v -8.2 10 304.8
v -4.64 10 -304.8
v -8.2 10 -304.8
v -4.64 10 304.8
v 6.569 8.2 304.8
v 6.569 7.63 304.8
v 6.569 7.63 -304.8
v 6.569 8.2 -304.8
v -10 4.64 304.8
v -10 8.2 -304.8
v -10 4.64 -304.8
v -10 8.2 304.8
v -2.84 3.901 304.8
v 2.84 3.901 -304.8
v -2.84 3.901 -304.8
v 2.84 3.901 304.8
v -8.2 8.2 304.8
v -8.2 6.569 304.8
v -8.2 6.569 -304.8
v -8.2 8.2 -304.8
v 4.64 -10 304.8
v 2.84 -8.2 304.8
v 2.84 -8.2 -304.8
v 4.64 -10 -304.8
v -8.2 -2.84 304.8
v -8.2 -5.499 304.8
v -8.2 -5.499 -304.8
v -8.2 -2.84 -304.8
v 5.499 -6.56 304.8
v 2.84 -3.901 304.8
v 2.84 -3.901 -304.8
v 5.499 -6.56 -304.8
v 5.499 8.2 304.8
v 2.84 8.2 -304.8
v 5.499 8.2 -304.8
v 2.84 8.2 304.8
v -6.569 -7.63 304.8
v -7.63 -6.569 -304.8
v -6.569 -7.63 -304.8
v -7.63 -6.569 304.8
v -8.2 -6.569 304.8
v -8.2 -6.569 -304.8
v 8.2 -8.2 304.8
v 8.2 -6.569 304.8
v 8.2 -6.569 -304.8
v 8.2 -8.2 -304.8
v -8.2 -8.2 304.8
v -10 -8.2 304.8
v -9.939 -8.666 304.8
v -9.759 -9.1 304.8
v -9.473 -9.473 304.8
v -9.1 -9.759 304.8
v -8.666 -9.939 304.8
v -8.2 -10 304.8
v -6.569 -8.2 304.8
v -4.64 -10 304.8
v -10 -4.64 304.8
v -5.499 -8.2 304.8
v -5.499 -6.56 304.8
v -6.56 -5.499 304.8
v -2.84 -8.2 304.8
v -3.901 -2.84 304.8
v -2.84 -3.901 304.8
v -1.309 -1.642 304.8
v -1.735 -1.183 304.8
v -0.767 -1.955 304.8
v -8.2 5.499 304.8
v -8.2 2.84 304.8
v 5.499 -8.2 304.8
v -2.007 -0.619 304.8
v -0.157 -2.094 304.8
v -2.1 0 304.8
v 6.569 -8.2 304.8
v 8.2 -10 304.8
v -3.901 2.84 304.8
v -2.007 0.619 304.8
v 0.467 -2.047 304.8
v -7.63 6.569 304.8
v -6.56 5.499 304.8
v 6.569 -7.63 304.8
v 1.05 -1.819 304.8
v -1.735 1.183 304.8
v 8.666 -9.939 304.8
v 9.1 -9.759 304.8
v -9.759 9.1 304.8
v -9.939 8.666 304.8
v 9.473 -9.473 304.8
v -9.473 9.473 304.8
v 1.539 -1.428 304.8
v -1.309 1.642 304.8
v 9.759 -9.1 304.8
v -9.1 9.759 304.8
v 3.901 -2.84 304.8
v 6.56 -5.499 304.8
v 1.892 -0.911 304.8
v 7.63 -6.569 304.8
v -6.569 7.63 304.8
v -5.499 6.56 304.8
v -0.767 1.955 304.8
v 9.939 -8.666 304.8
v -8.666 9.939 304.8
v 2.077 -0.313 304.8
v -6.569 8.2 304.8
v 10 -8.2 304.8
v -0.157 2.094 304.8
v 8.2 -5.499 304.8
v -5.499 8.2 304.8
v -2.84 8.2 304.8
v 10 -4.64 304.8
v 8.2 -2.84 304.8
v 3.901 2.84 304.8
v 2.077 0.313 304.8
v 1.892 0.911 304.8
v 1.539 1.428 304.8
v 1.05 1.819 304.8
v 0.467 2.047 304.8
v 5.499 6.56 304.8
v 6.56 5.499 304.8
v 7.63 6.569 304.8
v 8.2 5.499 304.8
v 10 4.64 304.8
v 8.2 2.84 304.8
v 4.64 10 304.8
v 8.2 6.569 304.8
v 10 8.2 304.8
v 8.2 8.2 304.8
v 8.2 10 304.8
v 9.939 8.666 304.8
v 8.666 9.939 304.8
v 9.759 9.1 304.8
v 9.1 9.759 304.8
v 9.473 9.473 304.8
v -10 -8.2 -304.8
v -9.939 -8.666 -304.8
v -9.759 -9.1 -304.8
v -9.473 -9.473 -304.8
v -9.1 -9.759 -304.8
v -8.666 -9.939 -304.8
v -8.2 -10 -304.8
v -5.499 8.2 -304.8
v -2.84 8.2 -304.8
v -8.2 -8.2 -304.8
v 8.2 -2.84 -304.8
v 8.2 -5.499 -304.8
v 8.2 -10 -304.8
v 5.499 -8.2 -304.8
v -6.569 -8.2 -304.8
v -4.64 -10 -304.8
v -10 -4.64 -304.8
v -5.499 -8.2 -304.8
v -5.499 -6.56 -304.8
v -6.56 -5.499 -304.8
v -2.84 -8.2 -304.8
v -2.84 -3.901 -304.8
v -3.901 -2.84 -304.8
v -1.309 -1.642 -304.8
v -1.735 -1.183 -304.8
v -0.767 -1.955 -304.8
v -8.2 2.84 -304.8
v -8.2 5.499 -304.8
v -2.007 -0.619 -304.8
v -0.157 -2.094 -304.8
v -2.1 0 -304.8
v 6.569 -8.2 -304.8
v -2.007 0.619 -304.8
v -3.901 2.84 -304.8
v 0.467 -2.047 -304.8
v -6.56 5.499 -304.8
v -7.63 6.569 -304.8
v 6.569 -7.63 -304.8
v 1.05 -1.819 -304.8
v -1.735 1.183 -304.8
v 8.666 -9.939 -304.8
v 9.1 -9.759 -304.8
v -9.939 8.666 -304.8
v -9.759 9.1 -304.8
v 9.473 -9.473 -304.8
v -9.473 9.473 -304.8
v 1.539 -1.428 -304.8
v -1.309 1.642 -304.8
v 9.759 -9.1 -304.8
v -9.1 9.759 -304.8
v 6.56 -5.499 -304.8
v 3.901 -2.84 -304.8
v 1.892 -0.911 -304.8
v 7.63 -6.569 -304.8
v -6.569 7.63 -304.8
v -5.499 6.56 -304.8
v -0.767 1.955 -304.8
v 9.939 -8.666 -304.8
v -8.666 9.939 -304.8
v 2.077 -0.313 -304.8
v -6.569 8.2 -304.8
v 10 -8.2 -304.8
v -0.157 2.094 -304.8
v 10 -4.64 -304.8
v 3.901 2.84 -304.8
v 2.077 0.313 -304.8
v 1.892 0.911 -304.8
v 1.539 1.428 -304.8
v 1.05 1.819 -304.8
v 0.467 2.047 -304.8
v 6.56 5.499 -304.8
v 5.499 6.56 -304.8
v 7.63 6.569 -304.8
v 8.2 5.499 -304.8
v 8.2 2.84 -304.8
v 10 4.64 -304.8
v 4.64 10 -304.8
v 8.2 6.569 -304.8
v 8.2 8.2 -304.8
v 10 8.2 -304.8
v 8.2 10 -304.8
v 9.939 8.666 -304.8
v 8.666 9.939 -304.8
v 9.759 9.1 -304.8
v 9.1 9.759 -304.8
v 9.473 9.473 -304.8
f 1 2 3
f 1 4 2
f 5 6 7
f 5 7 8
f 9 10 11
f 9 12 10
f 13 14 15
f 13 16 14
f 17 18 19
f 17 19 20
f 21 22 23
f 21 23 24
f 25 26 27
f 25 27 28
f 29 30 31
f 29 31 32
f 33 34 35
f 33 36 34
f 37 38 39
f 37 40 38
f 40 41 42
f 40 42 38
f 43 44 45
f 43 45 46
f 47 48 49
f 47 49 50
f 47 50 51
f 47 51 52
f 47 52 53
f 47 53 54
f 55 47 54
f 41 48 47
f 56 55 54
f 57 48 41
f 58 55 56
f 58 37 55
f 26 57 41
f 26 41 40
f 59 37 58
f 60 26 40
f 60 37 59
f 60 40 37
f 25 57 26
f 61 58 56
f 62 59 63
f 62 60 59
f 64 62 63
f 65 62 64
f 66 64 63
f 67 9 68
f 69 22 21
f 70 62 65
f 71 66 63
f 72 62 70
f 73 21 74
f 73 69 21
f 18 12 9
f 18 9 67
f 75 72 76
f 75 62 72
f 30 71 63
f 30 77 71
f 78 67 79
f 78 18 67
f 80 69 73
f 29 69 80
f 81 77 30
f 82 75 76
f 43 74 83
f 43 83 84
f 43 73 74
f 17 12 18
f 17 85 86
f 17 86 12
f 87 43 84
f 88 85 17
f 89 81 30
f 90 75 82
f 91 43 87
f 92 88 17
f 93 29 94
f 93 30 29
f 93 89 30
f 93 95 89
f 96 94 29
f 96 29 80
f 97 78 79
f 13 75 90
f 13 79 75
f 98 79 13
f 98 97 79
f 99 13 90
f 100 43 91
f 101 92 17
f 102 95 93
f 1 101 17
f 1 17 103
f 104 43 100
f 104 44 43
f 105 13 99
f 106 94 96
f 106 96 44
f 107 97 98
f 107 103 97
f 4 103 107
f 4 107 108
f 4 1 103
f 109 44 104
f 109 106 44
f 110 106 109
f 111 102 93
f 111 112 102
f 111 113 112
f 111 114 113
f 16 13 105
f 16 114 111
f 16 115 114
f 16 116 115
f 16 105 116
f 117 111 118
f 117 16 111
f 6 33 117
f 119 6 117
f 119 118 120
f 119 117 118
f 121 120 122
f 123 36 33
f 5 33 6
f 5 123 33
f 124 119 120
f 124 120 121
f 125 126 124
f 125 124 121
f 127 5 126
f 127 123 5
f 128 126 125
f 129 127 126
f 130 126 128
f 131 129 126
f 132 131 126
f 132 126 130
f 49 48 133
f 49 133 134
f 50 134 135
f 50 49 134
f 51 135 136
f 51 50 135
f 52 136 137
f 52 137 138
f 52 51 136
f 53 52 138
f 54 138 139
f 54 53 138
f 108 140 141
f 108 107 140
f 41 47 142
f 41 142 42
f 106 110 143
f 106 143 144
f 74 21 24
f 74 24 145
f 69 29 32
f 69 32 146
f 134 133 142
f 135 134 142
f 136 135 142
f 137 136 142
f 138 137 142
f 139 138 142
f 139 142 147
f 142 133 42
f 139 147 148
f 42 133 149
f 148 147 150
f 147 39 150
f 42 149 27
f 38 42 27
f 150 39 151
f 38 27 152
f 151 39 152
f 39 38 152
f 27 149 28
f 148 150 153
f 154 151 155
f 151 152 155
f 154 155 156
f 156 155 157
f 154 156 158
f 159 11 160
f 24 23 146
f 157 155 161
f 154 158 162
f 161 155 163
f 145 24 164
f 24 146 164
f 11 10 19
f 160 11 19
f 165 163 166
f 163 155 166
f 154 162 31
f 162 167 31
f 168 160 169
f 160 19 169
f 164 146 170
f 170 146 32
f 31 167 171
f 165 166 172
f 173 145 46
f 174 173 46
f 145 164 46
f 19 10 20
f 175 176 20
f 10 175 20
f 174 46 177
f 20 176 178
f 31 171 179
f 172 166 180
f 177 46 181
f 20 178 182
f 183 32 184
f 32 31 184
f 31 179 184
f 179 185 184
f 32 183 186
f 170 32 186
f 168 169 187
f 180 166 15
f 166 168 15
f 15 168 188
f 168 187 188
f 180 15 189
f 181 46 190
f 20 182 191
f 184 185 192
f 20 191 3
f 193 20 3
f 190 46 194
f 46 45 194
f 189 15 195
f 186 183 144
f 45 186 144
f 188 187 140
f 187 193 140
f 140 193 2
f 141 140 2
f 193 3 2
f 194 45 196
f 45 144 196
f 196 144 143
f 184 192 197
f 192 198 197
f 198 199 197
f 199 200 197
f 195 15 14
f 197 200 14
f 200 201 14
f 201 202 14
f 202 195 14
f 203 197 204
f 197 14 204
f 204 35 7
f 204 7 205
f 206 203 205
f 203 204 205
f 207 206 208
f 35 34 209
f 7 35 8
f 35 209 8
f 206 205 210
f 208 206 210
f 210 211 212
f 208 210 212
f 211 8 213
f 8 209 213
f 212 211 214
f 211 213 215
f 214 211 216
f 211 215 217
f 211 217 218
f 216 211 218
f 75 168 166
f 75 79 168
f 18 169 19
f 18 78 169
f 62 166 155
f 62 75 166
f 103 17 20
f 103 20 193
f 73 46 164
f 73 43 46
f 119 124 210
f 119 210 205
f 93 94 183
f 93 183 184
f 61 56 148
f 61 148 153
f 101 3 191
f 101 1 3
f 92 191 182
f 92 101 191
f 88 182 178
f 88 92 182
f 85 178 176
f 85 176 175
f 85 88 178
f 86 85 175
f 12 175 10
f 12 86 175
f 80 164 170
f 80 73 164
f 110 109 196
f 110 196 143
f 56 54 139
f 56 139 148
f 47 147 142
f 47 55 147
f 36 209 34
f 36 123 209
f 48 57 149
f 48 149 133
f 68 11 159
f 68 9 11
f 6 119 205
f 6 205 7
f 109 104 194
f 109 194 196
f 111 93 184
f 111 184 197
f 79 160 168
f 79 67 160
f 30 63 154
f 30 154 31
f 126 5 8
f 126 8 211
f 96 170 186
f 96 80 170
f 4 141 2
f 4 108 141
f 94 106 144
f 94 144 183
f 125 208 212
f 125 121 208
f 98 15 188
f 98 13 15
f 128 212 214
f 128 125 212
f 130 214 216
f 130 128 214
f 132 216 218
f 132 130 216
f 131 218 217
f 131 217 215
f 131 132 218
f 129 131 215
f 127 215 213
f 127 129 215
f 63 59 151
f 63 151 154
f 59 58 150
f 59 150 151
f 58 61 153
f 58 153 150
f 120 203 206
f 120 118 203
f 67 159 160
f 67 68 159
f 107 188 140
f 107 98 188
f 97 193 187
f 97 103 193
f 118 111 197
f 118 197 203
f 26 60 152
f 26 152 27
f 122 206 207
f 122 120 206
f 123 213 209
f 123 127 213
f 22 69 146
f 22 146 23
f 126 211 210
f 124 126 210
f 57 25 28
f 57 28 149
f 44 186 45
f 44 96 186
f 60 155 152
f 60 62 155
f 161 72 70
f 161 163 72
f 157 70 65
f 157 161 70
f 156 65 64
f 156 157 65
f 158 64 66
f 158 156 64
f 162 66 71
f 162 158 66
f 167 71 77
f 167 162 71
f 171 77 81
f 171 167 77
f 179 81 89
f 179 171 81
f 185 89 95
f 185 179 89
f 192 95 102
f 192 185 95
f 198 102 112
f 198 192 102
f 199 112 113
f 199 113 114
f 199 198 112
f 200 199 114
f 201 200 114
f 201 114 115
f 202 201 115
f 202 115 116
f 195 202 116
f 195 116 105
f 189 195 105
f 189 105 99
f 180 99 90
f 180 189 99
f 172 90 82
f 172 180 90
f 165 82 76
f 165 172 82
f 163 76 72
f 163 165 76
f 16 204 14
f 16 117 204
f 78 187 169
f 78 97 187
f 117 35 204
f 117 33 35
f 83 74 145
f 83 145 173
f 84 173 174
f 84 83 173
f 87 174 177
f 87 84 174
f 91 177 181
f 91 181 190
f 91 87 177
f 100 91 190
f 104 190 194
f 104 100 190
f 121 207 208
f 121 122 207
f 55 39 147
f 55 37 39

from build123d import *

# Parameters (mm, degrees)
SKETCH1_R      = 2.1
EXTRUDE1_DEPTH = 304.8


with BuildPart() as part:
    # Sketch1 → Extrude1 (new, symmetric)
    with BuildSketch(Plane.XY):
        with BuildLine():
            Line((-3.900660172, 0), (-3.900660172, -2.84))
            Line((-3.900660172, -2.84), (-6.56, -5.499339828))
            Line((-6.56, -5.499339828), (-8.2, -5.499339828))
            Line((-8.2, -5.499339828), (-8.2, -2.84))
            Line((-8.2, -2.84), (-10, -4.64))
            Line((-10, -4.64), (-10, -8.2))
            ThreePointArc((-10, -8.2), (-9.472792206, -9.472792206), (-8.2, -10))
            Line((-8.2, -10), (-4.64, -10))
            Line((-4.64, -10), (-2.84, -8.2))
            Line((-2.84, -8.2), (-5.499339828, -8.2))
            Line((-5.499339828, -8.2), (-5.499339828, -6.56))
            Line((-5.499339828, -6.56), (-2.84, -3.900660172))
            Line((-2.84, -3.900660172), (0, -3.900660172))
            Line((0, -3.900660172), (2.84, -3.900660172))
            Line((2.84, -3.900660172), (5.499339828, -6.56))
            Line((5.499339828, -6.56), (5.499339828, -8.2))
            Line((5.499339828, -8.2), (2.84, -8.2))
            Line((2.84, -8.2), (4.64, -10))
            Line((4.64, -10), (8.2, -10))
            ThreePointArc((8.2, -10), (9.472792206, -9.472792206), (10, -8.2))
            Line((10, -8.2), (10, -4.64))
            Line((10, -4.64), (8.2, -2.84))
            Line((8.2, -2.84), (8.2, -5.499339828))
            Line((8.2, -5.499339828), (6.56, -5.499339828))
            Line((6.56, -5.499339828), (3.900660172, -2.84))
            Line((3.900660172, -2.84), (3.900660172, 0))
            Line((3.900660172, 0), (3.900660172, 2.84))
            Line((3.900660172, 2.84), (6.56, 5.499339828))
            Line((6.56, 5.499339828), (8.2, 5.499339828))
            Line((8.2, 5.499339828), (8.2, 2.84))
            Line((8.2, 2.84), (10, 4.64))
            Line((10, 4.64), (10, 8.2))
            ThreePointArc((10, 8.2), (9.472792206, 9.472792206), (8.2, 10))
            Line((8.2, 10), (4.64, 10))
            Line((4.64, 10), (2.84, 8.2))
            Line((2.84, 8.2), (5.499339828, 8.2))
            Line((5.499339828, 8.2), (5.499339828, 6.56))
            Line((5.499339828, 6.56), (2.84, 3.900660172))
            Line((2.84, 3.900660172), (0, 3.900660172))
            Line((0, 3.900660172), (-2.84, 3.900660172))
            Line((-2.84, 3.900660172), (-5.499339828, 6.56))
            Line((-5.499339828, 6.56), (-5.499339828, 8.2))
            Line((-5.499339828, 8.2), (-2.84, 8.2))
            Line((-2.84, 8.2), (-4.64, 10))
            Line((-4.64, 10), (-8.2, 10))
            ThreePointArc((-8.2, 10), (-9.472792206, 9.472792206), (-10, 8.2))
            Line((-10, 8.2), (-10, 4.64))
            Line((-10, 4.64), (-8.2, 2.84))
            Line((-8.2, 2.84), (-8.2, 5.499339828))
            Line((-8.2, 5.499339828), (-6.56, 5.499339828))
            Line((-6.56, 5.499339828), (-3.900660172, 2.84))
            Line((-3.900660172, 2.84), (-3.900660172, 0))
        make_face()
        with Locations(Location((0, 0, 0), (0, 0, 180))):
            Circle(SKETCH1_R, mode=Mode.SUBTRACT)
        Polygon((-8.2, -8.2), (-8.2, -6.569339828), (-7.63, -6.569339828), (-6.569339828, -7.63), (-6.569339828, -8.2), align=None, mode=Mode.SUBTRACT)
        Polygon((-8.2, 6.569339828), (-8.2, 8.2), (-6.569339828, 8.2), (-6.569339828, 7.63), (-7.63, 6.569339828), align=None, mode=Mode.SUBTRACT)
        Polygon((6.569339828, 8.2), (8.2, 8.2), (8.2, 6.569339828), (7.63, 6.569339828), (6.569339828, 7.63), align=None, mode=Mode.SUBTRACT)
        Polygon((8.2, -6.569339828), (8.2, -8.2), (6.569339828, -8.2), (6.569339828, -7.63), (7.63, -6.569339828), align=None, mode=Mode.SUBTRACT)
    extrude(amount=EXTRUDE1_DEPTH, both=True)


solid = part.part
